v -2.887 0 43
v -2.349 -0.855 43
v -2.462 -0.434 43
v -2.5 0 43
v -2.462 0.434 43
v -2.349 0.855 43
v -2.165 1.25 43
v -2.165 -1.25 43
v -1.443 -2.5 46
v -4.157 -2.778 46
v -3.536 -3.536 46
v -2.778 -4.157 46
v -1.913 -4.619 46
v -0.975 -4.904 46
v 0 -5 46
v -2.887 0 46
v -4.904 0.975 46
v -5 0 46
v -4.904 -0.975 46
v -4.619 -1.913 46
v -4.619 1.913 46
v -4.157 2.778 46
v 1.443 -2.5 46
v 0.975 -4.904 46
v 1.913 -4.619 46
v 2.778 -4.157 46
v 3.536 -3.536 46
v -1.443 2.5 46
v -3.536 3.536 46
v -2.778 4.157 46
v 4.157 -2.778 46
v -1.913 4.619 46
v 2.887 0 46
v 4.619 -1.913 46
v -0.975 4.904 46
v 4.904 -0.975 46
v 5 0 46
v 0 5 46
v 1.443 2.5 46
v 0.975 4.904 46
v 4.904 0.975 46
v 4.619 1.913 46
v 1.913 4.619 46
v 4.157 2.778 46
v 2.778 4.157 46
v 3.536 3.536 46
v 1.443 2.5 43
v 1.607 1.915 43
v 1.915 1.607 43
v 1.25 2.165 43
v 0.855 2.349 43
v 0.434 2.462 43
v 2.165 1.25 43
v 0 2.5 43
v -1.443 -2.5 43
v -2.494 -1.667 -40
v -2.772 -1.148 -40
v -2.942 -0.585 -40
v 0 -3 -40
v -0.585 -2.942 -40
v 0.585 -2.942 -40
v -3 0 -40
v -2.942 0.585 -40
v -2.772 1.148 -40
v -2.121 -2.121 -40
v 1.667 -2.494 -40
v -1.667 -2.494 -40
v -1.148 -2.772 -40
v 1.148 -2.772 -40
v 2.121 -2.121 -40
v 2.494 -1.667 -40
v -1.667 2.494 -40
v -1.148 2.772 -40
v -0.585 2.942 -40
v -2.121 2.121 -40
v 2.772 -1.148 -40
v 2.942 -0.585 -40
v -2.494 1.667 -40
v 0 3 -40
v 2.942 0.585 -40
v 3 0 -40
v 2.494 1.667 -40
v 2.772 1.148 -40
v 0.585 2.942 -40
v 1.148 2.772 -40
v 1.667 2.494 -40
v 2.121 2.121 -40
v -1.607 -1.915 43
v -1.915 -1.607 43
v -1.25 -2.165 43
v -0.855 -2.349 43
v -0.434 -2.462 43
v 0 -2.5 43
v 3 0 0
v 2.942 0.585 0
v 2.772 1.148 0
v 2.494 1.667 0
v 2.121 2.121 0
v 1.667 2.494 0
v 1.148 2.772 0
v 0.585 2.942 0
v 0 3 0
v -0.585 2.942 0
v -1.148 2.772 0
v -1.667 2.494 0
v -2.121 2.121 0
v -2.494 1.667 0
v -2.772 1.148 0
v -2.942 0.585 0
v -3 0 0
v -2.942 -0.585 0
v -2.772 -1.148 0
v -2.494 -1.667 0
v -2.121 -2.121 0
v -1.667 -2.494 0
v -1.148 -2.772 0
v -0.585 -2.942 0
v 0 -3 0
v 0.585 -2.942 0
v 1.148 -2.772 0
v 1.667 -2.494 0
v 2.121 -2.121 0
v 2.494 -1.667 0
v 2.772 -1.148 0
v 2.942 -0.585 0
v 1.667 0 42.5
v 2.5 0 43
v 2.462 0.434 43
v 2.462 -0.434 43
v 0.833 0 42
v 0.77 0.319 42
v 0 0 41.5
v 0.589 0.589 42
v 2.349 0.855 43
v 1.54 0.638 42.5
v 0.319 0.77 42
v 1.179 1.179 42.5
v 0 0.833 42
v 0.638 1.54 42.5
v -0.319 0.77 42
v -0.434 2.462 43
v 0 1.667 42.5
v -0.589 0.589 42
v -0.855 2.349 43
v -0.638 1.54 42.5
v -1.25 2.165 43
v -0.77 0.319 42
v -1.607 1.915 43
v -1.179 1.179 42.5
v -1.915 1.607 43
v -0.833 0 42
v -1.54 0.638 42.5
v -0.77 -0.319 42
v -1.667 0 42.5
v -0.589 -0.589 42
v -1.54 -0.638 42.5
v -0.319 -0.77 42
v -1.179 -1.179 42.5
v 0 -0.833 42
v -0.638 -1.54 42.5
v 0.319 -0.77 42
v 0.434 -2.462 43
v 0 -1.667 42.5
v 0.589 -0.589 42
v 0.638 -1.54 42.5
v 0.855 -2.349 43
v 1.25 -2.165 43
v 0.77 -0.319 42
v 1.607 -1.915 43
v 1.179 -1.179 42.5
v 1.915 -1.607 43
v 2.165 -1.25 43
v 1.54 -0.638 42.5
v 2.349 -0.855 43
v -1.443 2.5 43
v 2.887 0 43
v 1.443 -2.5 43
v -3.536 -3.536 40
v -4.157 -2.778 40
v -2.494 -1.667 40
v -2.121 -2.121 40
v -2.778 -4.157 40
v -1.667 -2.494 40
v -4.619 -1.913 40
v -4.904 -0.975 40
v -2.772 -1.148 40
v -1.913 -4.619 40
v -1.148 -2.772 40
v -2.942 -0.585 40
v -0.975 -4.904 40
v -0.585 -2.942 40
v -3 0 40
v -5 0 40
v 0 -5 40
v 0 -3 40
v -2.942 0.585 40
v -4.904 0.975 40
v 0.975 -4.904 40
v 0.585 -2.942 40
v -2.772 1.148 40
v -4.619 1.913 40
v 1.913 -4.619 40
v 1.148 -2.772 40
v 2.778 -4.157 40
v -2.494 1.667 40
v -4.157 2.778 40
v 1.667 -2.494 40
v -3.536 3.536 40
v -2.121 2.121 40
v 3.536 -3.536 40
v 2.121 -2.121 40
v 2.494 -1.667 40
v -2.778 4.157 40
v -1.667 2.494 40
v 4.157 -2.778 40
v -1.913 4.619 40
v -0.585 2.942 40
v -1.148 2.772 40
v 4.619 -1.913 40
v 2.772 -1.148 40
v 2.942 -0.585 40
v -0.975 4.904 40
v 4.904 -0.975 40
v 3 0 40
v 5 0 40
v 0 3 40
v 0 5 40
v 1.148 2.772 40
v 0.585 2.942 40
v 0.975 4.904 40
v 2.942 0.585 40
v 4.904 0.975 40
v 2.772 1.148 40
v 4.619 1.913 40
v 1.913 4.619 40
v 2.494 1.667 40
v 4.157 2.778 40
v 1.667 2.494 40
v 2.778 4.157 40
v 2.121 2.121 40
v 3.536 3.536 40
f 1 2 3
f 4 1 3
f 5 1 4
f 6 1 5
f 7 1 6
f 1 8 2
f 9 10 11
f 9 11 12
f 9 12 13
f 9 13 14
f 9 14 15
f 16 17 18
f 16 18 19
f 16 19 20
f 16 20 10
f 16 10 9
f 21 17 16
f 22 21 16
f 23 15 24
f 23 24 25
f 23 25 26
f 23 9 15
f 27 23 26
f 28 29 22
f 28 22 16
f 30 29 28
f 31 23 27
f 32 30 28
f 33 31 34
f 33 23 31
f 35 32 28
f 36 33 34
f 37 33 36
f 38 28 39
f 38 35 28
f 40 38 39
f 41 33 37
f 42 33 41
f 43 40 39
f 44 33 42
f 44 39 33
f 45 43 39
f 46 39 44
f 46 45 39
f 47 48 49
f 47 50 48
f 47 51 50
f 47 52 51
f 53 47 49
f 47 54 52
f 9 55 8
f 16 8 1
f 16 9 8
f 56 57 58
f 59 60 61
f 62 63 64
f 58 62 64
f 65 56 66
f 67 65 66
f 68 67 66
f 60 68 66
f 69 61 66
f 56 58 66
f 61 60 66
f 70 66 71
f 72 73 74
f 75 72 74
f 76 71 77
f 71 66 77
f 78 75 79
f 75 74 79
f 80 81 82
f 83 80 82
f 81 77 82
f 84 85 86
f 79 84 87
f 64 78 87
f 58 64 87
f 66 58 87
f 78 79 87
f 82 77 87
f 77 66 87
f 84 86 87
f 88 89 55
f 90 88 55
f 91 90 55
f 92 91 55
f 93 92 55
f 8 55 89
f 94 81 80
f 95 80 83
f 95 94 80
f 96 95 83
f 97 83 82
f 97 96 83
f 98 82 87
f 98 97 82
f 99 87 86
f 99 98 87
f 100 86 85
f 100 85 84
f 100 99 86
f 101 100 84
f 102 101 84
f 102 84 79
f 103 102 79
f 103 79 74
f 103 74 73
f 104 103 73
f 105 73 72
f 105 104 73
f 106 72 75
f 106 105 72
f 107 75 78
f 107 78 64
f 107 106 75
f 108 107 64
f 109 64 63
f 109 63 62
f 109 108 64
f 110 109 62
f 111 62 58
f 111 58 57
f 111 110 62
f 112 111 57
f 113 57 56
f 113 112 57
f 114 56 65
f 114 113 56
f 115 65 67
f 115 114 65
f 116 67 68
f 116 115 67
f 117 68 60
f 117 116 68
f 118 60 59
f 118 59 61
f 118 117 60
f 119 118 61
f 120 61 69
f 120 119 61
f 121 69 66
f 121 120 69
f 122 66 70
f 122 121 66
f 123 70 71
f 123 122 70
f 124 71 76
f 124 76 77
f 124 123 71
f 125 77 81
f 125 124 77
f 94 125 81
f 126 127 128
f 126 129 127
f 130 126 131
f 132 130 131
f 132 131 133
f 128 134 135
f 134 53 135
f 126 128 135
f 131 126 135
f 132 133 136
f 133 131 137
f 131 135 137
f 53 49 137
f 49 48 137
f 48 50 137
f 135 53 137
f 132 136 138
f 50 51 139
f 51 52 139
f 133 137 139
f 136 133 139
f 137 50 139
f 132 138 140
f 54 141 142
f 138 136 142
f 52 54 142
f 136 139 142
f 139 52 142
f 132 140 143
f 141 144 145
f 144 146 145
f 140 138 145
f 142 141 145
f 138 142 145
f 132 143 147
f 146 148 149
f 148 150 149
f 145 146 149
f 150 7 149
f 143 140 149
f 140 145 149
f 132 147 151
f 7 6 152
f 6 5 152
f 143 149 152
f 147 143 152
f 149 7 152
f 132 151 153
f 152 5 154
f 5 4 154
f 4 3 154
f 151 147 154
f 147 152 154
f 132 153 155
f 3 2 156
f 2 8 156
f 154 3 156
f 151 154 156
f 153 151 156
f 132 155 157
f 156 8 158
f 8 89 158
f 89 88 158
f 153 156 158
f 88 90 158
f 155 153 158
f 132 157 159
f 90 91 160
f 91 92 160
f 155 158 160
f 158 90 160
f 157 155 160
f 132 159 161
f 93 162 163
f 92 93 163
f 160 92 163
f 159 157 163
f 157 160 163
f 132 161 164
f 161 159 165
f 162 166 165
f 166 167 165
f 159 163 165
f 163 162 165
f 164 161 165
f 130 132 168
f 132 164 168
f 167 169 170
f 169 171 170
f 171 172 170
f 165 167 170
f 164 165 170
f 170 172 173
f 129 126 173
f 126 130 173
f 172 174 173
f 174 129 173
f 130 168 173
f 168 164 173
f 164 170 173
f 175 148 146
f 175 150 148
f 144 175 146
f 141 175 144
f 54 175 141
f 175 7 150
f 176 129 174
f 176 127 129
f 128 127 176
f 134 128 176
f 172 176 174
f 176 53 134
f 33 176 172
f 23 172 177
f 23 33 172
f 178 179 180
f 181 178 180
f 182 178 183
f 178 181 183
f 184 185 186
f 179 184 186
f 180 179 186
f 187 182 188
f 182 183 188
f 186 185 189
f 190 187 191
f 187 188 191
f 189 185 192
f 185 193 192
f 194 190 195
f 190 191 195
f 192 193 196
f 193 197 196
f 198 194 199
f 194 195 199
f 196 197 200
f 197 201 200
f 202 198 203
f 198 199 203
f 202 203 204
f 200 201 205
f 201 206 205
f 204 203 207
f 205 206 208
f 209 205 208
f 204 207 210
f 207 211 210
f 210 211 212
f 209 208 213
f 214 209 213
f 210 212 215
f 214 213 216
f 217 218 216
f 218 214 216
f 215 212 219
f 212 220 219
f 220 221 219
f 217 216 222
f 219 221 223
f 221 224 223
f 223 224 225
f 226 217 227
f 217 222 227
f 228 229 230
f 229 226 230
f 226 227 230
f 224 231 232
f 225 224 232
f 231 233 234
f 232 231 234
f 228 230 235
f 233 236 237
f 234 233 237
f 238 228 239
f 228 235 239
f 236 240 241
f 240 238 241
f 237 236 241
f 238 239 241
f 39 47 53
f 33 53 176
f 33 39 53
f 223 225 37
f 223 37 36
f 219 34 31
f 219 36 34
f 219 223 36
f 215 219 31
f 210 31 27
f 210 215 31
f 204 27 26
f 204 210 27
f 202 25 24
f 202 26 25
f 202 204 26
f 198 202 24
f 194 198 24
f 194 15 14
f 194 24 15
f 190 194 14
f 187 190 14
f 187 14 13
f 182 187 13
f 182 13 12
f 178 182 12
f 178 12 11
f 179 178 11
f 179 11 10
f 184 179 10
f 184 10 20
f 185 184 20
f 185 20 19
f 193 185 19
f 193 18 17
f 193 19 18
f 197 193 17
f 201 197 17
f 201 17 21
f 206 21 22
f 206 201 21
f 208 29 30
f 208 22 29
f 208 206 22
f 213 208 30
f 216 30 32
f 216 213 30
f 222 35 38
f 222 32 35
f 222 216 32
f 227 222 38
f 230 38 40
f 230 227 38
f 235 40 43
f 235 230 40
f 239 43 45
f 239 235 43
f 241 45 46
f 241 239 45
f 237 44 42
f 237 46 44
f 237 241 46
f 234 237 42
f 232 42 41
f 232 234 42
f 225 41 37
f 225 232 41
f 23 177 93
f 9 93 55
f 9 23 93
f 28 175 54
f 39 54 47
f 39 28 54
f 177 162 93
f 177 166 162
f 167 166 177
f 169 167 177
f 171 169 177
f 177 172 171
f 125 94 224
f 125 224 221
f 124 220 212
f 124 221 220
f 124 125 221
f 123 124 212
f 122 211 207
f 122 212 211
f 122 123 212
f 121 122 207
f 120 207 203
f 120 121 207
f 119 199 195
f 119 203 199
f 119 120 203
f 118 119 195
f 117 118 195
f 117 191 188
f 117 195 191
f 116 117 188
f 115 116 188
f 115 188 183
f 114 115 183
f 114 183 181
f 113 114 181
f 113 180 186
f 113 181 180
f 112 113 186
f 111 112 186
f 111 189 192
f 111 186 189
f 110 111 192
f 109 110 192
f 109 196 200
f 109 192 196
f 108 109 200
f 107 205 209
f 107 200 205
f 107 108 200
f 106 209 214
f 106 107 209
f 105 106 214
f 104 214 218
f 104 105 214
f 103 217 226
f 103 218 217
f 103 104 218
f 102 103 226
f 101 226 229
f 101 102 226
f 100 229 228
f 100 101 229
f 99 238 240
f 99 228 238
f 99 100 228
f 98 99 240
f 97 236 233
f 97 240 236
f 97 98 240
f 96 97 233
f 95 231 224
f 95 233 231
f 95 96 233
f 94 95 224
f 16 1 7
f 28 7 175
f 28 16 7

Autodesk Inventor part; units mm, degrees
ref_plane "YZ Plane" through (0, 0, 0) normal (1, 0, 0) x (0, 1, 0)
ref_plane "XZ Plane" through (0, 0, 0) normal (0, 1, 0) x (-1, 0, 0)
sketch "Sketch1" plane through (0, 0, 0) normal (0, 0, 1) x (1, 0, 0)
  circle A0 centre (0, 0) radius 3
  dimension "d0" = 6
extrude "Extrusion1" add sketch "Sketch1" along normal mid plane 80
sketch "Sketch2" plane through (0, 0, 40) normal (0, 0, 1) x (1, 0, 0)
  circle A0 centre (0, 0) radius 5
  dimension "d3" = 10
extrude "Extrusion2" add sketch "Sketch2" along normal blind 6
thread "Thread1" size "M6x1" class "6g" standard "ISO Metric profile" length 80
sketch "Sketch3" plane through (0, 0, 46) normal (0, 0, 1) x (1, 0, 0)
  circle A0 centre (0, 0) radius 3 projected
  line L0 (1.4434, 2.5) -> (2.8868, 0)
  line L1 (2.8868, 0) -> (1.4434, -2.5)
  line L2 (1.4434, -2.5) -> (-1.4434, -2.5)
  line L3 (-1.4434, -2.5) -> (-2.8868, 0)
  line L4 (-2.8868, 0) -> (-1.4434, 2.5)
  line L5 (-1.4434, 2.5) -> (1.4434, 2.5)
  dimension "d8" = 5
extrude "Extrusion3" cut sketch "Sketch3" against normal blind 3 contours L0 L1 L2 L3 L4 L5
ref_plane "Work Plane2" through (0, 0, 41.5) normal (0, 0, 1) x (1, 0, 0)
sketch "Sketch5" plane through (0, 0, 41.5) normal (0, 0, 1) x (1, 0, 0)
  point P0 (0, 0)
  point P1 (0, 0)
sketch "Sketch6" plane through (0, 0, 43) normal (0, 0, 1) x (1, 0, 0)
  circle A0 centre (0, 0) radius 2.5
  dimension "d13" = 5
loft "Loft1" cut profiles "Sketch6" section 2 point at (0, 0, 41.5)
properties part number "HCMUTE-CDT23-M6X80_SUOT" material "Stainless Steel"
